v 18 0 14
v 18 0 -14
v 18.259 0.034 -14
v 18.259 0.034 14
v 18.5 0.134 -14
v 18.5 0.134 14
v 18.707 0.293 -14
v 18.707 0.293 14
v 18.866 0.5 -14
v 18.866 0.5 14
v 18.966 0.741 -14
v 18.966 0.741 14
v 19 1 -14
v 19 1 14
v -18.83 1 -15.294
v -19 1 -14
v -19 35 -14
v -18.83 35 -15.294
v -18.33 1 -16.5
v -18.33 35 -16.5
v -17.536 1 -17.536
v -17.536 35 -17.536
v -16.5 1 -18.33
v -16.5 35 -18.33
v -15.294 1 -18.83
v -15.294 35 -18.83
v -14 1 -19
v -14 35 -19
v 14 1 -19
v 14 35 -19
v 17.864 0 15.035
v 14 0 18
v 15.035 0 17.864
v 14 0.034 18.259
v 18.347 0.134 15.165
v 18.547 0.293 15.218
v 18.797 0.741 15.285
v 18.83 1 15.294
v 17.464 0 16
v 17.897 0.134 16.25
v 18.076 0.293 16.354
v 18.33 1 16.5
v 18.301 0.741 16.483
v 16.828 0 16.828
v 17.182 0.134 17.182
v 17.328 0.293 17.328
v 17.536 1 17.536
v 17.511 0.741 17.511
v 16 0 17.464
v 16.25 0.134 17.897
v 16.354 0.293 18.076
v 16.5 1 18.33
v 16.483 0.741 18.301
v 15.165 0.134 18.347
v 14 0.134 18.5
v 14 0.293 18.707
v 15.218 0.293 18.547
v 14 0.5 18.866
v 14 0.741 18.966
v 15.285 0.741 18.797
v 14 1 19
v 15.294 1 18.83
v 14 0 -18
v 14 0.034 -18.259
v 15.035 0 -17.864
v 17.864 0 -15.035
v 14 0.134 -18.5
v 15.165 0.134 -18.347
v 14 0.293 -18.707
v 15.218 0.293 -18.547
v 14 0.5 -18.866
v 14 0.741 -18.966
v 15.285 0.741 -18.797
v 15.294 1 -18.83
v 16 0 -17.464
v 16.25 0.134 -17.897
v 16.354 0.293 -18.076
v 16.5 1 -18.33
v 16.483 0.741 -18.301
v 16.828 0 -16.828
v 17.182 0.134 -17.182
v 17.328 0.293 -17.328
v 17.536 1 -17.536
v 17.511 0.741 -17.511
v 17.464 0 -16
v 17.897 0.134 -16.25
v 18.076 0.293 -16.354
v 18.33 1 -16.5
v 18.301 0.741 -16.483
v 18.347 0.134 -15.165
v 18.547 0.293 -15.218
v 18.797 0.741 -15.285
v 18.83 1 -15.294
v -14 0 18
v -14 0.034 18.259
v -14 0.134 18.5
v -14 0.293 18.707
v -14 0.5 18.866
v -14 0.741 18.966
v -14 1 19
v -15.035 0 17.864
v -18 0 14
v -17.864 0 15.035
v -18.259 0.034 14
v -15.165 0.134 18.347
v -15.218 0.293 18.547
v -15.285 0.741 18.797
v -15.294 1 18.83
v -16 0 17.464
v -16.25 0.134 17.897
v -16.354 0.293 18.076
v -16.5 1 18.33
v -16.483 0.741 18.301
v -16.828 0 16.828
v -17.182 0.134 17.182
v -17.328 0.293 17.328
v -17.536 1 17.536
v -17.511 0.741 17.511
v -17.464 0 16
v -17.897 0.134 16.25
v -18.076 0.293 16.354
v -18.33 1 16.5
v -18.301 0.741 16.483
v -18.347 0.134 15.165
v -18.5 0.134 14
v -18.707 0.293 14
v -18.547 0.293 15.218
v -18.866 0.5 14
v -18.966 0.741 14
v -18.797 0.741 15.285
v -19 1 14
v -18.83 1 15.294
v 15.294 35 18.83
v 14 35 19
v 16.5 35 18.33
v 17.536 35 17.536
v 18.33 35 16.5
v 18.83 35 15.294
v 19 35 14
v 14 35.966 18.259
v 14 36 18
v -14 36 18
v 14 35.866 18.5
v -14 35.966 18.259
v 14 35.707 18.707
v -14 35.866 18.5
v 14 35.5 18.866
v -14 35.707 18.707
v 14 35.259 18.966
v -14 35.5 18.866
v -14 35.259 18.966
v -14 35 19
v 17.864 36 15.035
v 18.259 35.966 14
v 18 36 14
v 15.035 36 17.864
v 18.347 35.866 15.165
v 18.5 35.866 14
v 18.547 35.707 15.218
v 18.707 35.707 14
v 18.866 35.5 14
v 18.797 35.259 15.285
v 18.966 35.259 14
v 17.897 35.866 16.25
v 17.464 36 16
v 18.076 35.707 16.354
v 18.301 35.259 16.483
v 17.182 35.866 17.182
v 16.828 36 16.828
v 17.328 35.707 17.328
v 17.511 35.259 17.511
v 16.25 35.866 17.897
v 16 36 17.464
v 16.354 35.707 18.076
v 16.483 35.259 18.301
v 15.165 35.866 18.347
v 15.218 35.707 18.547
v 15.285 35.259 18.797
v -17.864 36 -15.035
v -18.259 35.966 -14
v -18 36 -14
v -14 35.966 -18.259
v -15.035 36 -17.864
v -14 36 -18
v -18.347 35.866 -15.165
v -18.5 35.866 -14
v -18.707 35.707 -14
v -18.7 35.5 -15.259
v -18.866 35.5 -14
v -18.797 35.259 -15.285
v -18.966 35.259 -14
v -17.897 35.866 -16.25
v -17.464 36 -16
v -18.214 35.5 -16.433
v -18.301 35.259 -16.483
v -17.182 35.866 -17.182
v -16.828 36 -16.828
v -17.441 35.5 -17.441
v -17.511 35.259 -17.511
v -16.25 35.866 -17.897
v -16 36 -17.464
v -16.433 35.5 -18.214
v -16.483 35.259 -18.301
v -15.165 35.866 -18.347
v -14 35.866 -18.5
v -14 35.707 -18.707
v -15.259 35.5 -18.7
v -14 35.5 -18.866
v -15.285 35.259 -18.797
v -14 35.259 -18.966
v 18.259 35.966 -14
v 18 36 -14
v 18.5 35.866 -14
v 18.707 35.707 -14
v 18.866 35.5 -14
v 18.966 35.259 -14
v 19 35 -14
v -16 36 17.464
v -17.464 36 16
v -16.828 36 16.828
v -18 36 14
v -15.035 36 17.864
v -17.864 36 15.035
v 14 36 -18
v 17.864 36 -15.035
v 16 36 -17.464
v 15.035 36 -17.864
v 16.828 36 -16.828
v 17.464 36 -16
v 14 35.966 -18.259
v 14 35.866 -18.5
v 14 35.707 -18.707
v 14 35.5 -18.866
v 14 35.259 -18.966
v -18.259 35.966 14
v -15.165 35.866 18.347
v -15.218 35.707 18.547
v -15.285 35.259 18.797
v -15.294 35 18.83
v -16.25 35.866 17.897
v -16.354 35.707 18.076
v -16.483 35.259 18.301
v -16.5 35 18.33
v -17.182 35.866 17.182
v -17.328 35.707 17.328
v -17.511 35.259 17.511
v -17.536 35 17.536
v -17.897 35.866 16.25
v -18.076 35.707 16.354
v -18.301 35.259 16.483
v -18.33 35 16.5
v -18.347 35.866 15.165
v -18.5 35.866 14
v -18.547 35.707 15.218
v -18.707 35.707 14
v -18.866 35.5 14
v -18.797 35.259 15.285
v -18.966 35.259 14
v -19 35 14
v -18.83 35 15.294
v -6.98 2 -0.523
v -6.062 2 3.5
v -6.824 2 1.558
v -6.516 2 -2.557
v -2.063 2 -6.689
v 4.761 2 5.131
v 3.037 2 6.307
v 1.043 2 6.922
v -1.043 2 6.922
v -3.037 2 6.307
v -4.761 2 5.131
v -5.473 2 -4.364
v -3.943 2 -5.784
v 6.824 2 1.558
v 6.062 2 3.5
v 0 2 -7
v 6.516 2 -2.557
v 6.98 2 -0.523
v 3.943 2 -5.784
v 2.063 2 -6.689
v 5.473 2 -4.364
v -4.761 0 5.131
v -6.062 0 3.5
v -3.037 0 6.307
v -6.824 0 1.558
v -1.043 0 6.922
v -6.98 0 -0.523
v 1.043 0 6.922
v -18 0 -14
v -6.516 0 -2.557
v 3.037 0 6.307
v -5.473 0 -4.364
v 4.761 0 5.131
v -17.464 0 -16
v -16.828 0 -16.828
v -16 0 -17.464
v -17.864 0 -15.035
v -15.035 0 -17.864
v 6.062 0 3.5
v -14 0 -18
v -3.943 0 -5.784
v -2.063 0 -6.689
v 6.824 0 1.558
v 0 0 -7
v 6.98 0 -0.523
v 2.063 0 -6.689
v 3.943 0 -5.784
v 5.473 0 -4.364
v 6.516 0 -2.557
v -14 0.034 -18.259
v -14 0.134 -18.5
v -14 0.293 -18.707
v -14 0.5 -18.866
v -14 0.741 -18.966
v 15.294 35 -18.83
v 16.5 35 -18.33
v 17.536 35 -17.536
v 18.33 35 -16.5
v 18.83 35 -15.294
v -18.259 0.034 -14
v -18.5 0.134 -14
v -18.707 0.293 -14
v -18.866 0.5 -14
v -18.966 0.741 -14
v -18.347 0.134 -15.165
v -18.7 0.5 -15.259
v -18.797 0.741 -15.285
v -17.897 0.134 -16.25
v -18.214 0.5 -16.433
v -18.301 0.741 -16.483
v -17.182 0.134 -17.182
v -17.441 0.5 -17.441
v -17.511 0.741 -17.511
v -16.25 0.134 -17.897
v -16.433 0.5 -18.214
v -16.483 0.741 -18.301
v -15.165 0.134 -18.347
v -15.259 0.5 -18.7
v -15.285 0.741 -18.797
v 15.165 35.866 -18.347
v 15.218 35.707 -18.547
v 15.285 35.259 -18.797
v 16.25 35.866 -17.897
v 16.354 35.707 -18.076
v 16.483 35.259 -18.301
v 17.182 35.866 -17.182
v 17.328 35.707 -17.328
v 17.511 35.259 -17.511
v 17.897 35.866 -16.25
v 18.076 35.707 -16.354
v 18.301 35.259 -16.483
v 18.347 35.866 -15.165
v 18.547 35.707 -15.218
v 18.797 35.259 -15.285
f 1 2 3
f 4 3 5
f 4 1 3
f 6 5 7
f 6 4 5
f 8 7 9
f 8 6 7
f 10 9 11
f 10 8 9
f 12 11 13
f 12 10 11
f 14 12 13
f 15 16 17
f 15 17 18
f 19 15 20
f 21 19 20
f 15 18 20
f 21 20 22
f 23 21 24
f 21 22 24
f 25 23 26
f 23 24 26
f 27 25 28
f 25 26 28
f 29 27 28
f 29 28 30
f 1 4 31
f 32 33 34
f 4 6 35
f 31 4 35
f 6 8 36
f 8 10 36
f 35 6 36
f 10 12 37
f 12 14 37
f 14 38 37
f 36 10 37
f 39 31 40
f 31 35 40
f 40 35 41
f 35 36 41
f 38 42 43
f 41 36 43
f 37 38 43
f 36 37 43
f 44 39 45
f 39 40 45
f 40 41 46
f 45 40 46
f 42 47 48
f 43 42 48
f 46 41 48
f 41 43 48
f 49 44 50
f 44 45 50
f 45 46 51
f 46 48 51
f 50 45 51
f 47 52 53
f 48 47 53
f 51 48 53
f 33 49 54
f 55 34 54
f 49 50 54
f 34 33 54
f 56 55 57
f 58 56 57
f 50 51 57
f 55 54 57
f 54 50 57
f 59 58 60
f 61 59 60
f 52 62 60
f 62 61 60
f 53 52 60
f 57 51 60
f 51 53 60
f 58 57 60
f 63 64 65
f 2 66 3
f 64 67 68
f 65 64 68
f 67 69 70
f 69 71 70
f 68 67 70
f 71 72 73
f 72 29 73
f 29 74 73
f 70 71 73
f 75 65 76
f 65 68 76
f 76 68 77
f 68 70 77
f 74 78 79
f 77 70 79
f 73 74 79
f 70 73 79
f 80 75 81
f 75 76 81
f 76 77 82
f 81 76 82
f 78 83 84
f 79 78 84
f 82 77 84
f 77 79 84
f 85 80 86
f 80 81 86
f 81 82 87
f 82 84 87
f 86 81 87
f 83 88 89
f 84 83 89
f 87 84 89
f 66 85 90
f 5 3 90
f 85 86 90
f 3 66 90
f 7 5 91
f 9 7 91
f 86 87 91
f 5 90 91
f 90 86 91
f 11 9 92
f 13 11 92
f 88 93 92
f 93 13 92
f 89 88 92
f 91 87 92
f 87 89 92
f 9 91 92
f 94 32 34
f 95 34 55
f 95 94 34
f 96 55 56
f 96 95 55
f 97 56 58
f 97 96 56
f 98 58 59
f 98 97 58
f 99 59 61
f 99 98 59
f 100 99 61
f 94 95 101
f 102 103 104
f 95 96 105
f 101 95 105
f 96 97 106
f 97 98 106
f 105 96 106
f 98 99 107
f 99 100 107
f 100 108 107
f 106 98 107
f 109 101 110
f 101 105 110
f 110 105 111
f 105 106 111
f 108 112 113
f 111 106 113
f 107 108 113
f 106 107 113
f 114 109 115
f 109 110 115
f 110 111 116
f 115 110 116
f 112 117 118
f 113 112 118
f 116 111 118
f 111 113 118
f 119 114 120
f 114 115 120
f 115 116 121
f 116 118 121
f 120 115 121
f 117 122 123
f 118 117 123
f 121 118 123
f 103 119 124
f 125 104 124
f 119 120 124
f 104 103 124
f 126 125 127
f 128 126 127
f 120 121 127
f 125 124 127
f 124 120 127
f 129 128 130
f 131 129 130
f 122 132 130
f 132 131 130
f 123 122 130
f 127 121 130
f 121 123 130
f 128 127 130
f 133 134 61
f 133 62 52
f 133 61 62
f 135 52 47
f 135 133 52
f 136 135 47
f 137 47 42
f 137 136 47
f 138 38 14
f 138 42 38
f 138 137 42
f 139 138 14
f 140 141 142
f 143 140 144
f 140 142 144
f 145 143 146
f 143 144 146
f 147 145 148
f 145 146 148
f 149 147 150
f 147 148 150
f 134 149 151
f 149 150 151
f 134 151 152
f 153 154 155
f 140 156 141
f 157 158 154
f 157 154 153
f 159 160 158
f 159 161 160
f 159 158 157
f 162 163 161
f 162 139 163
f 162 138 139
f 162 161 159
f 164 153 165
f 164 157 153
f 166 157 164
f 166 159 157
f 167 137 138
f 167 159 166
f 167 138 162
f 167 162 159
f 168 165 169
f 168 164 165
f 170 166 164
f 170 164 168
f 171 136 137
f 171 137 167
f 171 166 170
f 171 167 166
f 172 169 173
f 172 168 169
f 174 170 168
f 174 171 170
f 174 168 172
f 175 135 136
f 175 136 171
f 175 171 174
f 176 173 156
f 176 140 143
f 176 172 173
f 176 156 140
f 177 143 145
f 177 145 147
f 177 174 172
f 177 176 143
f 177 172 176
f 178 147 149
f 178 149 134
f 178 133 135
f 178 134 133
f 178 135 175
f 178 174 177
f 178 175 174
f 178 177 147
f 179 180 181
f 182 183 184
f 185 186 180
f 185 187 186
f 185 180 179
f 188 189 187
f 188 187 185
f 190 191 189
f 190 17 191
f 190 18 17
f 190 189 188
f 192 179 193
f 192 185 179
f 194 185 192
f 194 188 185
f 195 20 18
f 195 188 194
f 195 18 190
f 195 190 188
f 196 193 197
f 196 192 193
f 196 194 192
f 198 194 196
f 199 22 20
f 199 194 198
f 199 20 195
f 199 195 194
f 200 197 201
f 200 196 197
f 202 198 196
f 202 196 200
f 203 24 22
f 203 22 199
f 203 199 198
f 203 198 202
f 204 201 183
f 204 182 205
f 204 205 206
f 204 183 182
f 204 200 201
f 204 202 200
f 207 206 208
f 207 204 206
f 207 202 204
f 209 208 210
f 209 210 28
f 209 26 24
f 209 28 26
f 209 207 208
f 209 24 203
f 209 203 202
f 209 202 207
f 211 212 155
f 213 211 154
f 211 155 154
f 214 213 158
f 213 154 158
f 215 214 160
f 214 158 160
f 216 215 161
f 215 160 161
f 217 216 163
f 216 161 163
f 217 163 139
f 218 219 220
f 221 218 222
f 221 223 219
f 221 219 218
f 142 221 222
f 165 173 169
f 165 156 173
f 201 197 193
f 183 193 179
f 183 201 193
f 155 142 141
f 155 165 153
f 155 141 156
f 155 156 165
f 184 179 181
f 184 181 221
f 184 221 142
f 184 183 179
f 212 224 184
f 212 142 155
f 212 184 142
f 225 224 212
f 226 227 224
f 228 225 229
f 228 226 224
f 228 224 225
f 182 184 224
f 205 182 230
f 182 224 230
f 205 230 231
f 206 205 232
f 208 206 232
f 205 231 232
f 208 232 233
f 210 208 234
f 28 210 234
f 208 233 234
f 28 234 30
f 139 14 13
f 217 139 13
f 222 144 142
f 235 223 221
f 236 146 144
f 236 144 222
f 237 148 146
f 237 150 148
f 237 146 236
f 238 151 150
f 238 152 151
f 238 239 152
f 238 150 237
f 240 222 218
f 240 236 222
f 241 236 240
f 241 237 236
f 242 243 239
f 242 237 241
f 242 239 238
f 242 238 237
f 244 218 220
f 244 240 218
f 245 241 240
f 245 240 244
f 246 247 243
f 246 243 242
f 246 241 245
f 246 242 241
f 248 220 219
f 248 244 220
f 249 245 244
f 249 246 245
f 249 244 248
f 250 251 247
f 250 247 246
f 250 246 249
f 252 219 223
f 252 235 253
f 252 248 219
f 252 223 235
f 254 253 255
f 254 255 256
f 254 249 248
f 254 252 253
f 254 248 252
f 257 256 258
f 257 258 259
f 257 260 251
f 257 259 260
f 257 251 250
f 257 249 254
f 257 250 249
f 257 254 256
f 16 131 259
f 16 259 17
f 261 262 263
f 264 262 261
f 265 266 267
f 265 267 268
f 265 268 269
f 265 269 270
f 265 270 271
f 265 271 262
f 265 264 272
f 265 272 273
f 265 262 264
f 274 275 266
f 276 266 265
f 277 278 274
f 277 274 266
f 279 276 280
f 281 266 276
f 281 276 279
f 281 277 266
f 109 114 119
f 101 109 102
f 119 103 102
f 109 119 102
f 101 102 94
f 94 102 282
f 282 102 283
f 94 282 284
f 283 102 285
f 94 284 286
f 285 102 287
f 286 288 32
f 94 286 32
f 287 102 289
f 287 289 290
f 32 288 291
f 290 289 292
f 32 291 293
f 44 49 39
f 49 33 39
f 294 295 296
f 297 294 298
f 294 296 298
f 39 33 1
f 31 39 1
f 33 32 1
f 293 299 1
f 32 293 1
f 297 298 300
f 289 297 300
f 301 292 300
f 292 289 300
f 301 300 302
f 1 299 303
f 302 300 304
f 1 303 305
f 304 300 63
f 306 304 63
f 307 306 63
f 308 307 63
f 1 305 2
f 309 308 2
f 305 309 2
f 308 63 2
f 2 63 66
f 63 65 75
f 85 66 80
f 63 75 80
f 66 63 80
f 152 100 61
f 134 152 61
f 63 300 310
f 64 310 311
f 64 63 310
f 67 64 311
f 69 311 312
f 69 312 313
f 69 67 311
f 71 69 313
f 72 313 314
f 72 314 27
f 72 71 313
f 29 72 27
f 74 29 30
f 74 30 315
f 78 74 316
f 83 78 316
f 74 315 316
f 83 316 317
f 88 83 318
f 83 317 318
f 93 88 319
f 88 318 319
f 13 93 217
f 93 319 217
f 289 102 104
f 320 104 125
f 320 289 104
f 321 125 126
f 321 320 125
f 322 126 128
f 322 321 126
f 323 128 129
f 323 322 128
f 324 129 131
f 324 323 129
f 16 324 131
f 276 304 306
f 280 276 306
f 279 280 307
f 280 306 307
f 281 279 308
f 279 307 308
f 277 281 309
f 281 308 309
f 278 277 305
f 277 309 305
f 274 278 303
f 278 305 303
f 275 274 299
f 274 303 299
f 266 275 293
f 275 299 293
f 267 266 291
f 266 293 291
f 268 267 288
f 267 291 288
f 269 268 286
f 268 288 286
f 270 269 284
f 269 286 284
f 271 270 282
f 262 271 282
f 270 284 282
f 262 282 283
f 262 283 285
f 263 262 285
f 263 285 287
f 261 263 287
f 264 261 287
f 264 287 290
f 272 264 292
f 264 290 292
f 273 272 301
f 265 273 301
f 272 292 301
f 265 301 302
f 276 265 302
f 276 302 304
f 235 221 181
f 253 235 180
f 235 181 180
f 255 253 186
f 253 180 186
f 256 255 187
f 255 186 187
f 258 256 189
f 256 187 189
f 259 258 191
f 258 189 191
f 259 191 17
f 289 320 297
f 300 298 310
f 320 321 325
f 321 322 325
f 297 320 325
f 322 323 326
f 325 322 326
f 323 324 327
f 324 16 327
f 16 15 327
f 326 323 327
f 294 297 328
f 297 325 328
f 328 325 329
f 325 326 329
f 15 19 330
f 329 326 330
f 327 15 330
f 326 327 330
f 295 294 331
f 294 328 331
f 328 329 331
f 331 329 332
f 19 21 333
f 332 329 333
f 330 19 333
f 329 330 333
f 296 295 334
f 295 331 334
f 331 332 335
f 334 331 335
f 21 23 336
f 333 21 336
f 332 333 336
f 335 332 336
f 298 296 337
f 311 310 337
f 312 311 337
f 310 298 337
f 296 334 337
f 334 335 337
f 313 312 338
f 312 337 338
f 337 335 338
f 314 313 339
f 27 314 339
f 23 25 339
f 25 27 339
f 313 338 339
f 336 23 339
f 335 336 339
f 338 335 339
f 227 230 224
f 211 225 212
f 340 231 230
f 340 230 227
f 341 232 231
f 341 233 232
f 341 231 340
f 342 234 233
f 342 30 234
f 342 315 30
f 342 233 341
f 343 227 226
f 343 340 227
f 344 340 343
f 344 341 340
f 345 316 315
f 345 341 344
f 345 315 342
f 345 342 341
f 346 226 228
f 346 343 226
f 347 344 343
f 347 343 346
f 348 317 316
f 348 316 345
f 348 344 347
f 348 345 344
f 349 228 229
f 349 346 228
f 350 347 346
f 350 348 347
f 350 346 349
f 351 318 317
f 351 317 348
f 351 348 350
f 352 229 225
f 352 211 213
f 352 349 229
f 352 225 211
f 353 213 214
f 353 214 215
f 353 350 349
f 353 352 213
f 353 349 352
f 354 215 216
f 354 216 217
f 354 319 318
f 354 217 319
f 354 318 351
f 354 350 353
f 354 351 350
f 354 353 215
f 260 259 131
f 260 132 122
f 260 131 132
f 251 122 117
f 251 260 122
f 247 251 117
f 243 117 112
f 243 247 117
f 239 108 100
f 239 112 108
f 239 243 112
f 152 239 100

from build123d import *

# Parameters (mm, degrees)
SKETCH1_W           = 38
SKETCH1_H           = 38
BOSS_EXTRUDE1_DEPTH = 36
SKETCH3_R           = 7
CUT_EXTRUDE1_DEPTH  = 2
FILLET1_R           = 5
FILLET2_R           = 1


with BuildPart() as part:
    # Sketch1 → Boss-Extrude1 (new body)
    with BuildSketch(Plane(origin=(0, 0, 0), x_dir=(1, 0, 0), z_dir=(0, 1, 0))):
        Rectangle(SKETCH1_W, SKETCH1_H)
    extrude(amount=BOSS_EXTRUDE1_DEPTH)

    # Sketch3 → Cut-Extrude1 (cut)
    with BuildSketch(Plane.XZ):
        with Locations(Location((0, 0, 0), (0, 0, 270))):
            Circle(SKETCH3_R)
    extrude(amount=-CUT_EXTRUDE1_DEPTH, mode=Mode.SUBTRACT)

    # Fillet1
    fillet1_edges = [part.edges().sort_by_distance(p)[0] for p in [
        (19, 18, 19),
        (-19, 18, 19),
        (-19, 18, -19),
        (19, 18, -19),
    ]]
    fillet(fillet1_edges, radius=FILLET1_R)

    # Fillet2
    fillet2_edges = [part.edges().sort_by_distance(p)[0] for p in [
        (0, 0, -19),
        (0, 36, -19),
        (19, 0, 0),
        (0, 0, 19),
        (-19, 0, 0),
        (-17.535533906, 0, 17.535533906),
        (-17.535533906, 0, -17.535533906),
        (17.535533906, 0, 17.535533906),
        (17.535533906, 0, -17.535533906),
        (19, 36, 0),
        (-19, 36, 0),
        (0, 36, 19),
        (-17.535533906, 36, 17.535533906),
        (-17.535533906, 36, -17.535533906),
        (17.535533906, 36, 17.535533906),
        (17.535533906, 36, -17.535533906),
    ]]
    fillet(fillet2_edges, radius=FILLET2_R)


solid = part.part
